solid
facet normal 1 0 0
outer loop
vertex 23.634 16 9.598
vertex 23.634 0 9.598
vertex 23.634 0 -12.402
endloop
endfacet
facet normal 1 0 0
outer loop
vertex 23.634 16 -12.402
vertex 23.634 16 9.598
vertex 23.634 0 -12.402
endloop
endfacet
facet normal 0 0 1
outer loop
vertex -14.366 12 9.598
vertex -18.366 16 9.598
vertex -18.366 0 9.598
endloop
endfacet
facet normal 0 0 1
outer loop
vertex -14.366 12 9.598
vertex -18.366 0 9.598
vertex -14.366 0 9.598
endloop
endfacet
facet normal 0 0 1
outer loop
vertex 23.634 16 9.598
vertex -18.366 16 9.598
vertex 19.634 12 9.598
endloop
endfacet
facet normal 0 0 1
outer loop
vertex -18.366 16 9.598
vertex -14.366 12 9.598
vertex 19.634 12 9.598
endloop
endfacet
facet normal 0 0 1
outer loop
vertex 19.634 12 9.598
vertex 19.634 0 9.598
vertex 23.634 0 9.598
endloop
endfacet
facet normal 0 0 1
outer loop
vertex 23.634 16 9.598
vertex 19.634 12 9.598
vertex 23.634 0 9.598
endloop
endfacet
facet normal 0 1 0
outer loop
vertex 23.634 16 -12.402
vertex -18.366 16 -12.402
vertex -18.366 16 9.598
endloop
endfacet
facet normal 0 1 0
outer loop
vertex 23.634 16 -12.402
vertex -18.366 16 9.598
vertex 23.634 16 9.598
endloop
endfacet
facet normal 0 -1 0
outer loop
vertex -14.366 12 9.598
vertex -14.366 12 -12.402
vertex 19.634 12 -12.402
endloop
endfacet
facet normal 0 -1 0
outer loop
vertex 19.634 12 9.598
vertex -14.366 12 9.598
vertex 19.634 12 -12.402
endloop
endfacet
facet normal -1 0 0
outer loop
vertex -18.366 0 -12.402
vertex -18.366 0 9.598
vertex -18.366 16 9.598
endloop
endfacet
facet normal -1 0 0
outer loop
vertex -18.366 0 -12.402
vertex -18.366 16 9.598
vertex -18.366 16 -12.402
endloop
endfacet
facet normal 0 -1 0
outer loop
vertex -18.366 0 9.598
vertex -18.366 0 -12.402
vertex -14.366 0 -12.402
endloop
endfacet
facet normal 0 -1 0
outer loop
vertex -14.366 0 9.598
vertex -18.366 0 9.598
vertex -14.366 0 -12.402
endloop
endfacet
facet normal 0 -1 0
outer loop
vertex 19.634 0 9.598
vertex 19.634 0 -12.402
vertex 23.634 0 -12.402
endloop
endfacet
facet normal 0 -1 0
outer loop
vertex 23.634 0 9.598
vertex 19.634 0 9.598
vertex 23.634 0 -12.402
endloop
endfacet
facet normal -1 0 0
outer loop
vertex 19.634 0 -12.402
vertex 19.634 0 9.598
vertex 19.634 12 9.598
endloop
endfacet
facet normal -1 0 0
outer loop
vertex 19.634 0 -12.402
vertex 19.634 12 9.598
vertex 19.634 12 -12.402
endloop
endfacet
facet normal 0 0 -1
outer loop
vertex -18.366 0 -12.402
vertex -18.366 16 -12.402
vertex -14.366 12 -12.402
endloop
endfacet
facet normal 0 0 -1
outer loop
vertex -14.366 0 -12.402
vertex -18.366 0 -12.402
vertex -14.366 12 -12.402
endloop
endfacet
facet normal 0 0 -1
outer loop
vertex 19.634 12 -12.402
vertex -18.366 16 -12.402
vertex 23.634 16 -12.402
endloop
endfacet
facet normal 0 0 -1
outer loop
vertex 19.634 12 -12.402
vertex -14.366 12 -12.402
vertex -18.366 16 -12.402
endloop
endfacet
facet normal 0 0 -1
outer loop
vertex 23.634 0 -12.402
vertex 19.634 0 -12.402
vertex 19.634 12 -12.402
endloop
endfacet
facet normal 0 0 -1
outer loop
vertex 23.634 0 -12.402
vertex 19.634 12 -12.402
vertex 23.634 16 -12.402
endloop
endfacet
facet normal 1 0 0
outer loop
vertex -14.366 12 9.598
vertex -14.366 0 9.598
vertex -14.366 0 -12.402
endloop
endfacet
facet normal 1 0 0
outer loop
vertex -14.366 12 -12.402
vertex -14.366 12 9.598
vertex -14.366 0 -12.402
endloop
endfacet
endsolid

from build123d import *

# Parameters (mm, degrees)
SKETCH1_W           = 42
SKETCH1_H           = 22
BOSS_EXTRUDE1_DEPTH = 16
SHELL2_T            = -4


with BuildPart() as part:
    # Sketch1 → Boss-Extrude1 (new body)
    with BuildSketch(Plane(origin=(0, 0, 0), x_dir=(1, 0, 0), z_dir=(0, 1, 0))):
        with Locations((2.633773294, 1.402399006)):
            Rectangle(SKETCH1_W, SKETCH1_H)
    extrude(amount=BOSS_EXTRUDE1_DEPTH)

    # Shell2
    shell2_openings = [part.faces().sort_by_distance(p)[0] for p in [
        (2.633773294, 0, -1.402399006),
        (2.633773294, 8, -12.402399006),
        (2.633773294, 8, 9.597600994),
    ]]
    offset(amount=SHELL2_T, openings=shell2_openings, kind=Kind.INTERSECTION)


solid = part.part
